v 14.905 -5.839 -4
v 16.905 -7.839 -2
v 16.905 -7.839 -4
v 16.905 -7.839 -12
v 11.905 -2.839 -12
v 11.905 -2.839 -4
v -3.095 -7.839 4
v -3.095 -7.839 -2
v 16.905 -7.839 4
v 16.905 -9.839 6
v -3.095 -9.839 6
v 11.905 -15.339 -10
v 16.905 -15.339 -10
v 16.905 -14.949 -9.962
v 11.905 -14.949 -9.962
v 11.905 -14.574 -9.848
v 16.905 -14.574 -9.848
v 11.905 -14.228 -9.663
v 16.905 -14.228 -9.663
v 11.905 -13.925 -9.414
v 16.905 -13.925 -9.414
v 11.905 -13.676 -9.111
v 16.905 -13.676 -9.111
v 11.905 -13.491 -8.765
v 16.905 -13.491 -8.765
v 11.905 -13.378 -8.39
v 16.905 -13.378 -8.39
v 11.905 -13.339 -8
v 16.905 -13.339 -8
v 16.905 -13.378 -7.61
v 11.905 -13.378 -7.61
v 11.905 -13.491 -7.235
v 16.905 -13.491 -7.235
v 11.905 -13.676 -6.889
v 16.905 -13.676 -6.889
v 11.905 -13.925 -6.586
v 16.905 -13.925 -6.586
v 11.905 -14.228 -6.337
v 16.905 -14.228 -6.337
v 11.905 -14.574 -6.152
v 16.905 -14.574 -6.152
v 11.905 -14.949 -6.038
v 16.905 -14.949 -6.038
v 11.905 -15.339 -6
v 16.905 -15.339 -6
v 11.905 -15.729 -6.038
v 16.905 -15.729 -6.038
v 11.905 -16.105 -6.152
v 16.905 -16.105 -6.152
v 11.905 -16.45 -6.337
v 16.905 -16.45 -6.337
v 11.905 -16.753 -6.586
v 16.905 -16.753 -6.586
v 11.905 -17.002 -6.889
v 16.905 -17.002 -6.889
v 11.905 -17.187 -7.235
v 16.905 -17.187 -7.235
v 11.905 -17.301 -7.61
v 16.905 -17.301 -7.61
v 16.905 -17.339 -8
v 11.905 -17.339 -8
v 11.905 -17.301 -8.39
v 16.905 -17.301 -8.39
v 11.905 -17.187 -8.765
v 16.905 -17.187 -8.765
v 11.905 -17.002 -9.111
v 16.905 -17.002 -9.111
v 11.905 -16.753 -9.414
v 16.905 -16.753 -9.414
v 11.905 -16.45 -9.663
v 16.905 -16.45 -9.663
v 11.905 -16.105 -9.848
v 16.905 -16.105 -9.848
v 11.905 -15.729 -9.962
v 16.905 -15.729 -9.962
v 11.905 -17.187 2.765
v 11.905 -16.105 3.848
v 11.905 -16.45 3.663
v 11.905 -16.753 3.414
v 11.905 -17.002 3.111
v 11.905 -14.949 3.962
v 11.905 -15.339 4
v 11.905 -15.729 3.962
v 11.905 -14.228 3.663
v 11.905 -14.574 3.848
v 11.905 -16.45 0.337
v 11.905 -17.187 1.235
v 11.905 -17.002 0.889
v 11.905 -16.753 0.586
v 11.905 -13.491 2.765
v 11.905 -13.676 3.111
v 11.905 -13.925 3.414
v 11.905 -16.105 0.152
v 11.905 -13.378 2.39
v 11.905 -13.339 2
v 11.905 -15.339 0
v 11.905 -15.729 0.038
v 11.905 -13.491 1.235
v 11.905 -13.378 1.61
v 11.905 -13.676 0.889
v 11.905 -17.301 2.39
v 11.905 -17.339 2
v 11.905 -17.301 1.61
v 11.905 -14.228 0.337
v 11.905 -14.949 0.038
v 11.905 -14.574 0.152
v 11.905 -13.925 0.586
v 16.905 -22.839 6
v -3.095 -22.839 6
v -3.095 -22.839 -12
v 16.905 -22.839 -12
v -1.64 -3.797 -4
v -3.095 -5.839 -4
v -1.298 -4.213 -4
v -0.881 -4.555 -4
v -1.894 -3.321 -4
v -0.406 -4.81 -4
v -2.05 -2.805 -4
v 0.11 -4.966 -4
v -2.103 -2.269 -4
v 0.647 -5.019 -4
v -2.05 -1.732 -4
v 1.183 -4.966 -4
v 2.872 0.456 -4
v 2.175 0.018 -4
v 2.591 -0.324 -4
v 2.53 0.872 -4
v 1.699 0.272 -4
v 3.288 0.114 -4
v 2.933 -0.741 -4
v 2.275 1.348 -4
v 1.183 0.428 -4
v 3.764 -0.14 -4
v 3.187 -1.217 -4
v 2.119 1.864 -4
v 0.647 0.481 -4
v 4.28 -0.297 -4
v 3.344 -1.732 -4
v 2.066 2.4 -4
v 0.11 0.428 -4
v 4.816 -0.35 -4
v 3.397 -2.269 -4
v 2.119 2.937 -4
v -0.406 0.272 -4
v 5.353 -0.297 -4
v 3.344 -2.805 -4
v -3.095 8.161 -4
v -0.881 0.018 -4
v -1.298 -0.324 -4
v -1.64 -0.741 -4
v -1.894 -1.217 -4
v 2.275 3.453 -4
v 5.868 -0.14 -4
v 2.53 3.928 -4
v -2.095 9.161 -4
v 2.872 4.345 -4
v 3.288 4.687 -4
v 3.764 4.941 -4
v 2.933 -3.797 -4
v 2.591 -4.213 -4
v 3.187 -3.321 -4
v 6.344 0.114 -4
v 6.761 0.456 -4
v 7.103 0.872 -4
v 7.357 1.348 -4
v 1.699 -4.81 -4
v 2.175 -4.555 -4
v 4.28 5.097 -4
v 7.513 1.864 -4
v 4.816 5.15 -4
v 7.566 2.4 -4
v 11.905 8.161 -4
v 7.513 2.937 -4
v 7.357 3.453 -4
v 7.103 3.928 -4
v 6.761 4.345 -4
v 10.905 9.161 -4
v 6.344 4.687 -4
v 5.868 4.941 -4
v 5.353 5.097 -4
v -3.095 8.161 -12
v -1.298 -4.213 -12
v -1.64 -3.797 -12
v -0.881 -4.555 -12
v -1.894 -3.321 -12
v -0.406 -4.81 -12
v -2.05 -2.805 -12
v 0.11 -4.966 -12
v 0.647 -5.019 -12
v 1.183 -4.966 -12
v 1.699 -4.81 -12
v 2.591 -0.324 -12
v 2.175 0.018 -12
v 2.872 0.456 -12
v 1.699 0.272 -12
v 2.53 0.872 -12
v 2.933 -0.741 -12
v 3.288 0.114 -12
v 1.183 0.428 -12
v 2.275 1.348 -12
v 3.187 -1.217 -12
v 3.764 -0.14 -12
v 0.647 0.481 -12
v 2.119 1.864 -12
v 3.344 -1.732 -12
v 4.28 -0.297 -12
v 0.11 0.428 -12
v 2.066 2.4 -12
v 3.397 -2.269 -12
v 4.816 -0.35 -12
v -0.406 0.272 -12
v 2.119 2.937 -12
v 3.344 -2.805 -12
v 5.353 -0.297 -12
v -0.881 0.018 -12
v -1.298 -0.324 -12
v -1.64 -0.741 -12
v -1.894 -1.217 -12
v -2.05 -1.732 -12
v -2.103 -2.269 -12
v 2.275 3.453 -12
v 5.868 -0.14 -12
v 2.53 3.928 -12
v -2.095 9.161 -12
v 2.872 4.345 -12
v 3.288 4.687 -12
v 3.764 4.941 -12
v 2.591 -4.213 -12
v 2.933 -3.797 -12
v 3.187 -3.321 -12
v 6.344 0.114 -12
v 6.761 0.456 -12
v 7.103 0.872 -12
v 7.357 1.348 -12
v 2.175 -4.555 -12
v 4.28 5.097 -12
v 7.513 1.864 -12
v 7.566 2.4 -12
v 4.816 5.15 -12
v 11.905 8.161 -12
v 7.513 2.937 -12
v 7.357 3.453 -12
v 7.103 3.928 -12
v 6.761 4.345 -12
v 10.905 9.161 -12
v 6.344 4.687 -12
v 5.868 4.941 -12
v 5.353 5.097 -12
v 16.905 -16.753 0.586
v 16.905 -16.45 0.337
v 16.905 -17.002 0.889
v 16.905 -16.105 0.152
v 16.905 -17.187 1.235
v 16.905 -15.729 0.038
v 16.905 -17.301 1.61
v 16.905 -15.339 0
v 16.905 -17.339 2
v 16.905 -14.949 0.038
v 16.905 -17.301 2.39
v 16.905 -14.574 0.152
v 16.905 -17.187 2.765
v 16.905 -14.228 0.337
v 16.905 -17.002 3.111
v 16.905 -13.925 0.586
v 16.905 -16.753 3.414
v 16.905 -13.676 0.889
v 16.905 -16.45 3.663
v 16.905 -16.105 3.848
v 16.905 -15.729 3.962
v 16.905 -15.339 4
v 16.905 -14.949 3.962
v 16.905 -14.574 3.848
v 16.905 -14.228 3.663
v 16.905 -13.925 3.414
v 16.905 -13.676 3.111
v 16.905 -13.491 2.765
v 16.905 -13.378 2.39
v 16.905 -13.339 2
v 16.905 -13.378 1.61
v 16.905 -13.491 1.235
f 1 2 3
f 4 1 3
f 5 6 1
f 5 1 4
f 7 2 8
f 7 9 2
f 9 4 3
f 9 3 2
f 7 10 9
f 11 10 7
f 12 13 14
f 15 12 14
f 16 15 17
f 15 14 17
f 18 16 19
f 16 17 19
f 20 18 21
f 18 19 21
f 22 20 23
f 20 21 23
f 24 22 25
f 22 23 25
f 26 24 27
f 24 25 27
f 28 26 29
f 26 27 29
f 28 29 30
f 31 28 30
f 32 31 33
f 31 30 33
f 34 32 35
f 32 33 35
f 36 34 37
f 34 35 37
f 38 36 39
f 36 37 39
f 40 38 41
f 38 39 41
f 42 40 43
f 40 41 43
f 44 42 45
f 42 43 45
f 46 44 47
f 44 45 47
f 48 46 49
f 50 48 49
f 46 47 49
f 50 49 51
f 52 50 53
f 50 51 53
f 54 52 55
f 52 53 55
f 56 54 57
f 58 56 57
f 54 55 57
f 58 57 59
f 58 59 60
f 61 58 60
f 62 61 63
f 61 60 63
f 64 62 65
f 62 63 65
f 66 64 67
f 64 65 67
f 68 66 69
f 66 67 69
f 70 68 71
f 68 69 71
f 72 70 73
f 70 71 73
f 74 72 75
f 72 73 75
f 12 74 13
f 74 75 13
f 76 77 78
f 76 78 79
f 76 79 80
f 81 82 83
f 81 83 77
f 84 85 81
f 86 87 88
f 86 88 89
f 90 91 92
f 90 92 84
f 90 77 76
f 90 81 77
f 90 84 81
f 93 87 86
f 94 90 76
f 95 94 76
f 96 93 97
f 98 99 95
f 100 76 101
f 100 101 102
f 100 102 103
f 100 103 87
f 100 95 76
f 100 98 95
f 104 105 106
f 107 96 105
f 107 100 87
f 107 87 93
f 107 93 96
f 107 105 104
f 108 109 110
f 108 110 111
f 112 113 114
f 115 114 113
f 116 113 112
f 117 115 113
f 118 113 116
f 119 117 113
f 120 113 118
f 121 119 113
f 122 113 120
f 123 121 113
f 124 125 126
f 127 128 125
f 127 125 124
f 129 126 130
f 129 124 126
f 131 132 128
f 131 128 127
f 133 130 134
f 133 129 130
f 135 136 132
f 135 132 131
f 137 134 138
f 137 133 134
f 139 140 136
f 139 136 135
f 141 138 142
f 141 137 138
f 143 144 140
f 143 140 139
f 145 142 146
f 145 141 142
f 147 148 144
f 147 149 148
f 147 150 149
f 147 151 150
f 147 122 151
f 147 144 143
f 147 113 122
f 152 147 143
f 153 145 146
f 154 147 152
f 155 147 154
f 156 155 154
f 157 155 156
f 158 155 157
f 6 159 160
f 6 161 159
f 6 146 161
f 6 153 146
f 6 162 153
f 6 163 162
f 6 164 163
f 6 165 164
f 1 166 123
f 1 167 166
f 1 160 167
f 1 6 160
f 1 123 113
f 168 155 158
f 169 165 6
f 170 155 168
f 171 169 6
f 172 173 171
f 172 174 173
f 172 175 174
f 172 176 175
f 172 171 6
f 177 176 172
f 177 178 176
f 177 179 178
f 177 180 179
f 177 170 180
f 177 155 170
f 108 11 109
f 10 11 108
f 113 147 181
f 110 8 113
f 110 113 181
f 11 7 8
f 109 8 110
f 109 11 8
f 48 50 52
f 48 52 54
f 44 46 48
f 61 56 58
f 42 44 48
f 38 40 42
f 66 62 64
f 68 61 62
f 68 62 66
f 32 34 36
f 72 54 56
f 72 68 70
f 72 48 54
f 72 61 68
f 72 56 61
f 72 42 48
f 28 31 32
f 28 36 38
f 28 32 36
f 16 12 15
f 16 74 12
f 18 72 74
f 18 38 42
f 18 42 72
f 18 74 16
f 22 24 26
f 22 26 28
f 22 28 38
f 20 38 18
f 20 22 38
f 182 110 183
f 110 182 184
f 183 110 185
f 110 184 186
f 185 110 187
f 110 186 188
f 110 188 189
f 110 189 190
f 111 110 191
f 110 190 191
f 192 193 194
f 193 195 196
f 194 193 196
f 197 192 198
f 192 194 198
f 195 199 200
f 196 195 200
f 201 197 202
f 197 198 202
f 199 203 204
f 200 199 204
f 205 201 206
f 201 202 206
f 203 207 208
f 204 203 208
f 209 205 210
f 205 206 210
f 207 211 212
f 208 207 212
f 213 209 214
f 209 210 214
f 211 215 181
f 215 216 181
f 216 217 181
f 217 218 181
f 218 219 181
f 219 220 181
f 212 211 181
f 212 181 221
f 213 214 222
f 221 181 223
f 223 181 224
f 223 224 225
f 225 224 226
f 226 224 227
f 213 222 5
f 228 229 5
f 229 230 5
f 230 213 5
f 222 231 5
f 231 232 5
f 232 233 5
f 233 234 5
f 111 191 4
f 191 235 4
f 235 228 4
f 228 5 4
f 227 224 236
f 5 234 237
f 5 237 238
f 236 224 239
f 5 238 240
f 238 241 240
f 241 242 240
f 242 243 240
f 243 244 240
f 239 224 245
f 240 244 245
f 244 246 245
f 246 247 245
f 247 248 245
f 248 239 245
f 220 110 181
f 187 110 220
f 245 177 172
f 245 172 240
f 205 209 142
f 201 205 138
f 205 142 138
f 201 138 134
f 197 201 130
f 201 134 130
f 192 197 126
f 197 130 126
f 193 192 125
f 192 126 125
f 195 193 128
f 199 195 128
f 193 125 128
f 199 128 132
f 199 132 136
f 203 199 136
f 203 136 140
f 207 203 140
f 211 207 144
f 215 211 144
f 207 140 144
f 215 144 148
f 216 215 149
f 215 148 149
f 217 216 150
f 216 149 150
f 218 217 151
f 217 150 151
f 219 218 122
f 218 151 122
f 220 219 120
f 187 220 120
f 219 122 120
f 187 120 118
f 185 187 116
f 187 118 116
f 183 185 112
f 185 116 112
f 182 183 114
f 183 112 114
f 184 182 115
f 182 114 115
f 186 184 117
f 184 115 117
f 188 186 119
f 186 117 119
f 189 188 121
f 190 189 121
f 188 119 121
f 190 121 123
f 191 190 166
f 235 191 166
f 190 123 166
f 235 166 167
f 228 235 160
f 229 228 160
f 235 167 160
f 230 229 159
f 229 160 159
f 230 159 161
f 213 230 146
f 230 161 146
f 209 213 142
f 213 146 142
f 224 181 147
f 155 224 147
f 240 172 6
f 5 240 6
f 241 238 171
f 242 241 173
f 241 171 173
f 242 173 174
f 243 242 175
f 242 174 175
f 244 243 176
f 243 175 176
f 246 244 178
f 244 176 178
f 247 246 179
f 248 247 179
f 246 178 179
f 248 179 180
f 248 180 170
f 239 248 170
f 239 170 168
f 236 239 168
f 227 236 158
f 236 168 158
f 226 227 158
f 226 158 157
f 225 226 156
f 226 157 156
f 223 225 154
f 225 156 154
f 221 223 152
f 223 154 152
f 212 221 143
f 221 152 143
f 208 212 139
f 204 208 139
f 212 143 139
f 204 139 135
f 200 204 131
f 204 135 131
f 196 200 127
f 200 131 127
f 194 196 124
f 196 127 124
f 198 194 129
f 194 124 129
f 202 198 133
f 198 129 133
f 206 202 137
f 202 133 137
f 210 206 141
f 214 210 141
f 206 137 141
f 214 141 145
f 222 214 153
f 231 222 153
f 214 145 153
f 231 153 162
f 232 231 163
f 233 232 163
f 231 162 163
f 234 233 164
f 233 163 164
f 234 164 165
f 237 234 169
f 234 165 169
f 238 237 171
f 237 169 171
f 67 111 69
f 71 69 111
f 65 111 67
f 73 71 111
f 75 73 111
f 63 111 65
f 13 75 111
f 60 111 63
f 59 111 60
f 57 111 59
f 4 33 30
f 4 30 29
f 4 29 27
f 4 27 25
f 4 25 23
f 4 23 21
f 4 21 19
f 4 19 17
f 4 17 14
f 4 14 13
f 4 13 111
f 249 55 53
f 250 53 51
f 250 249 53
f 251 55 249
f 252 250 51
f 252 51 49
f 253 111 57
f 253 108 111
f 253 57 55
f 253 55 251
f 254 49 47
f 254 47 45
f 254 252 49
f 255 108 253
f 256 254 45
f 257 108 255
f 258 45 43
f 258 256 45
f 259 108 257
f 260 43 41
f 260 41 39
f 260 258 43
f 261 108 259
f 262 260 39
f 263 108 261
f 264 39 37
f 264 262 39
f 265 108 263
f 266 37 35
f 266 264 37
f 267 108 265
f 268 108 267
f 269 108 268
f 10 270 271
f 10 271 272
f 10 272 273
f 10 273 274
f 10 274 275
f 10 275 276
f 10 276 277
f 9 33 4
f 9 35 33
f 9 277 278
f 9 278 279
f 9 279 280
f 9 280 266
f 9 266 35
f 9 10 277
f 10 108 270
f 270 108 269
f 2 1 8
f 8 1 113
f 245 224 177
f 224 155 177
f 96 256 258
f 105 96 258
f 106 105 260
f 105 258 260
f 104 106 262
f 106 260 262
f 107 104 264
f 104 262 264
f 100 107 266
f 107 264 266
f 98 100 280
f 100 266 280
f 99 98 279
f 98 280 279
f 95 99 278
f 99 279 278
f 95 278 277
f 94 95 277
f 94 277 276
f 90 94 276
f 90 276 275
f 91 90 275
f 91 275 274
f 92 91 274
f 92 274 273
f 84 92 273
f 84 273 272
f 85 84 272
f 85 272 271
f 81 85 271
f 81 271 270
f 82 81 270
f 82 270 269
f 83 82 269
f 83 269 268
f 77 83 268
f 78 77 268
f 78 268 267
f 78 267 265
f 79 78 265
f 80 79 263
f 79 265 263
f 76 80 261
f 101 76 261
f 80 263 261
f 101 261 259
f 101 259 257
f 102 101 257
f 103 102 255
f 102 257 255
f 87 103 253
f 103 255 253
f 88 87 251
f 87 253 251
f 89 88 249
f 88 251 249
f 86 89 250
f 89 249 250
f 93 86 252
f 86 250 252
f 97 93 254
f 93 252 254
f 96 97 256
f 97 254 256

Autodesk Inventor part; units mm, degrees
ref_plane "YZ Plane" through (0, 0, 0) normal (1, 0, 0) x (0, 1, 0)
ref_plane "XZ Plane" through (0, 0, 0) normal (0, 1, 0) x (-1, 0, 0)
ref_plane "XY Plane" through (0, 0, 0) normal (0, 0, 1) x (1, 0, 0)
sketch "草图1" plane through (0, 0, 0) normal (0, 0, 1) x (1, 0, 0)
  circle A0 centre (0.6467, -2.2689) radius 2.75
  circle A1 centre (4.8161, 2.4002) radius 2.5 construction
  circle A2 centre (4.8161, 2.4002) radius 2.5 construction
  circle A3 centre (4.8161, 2.4002) radius 2.5 construction
  line L0 (16.9048, -7.8392) -> (-3.0952, -7.8392)
  line L1 (-3.0952, -7.8392) -> (-3.0952, -22.8392)
  line L2 (-3.0952, -22.8392) -> (16.9048, -22.8392)
  line L3 (16.9048, -22.8392) -> (16.9048, -7.8392)
  line L4 (16.9048, -6.8375) -> (16.9048, -82.9867) projected
  line L5 (-1.0952, -7.8392) -> (16.9048, -7.8392) projected
  line L6 (-3.0952, 9.1608) -> (11.9048, 9.1608)
  line L7 (11.9048, 9.1608) -> (11.9048, -22.8392)
  line L8 (11.9048, -22.8392) -> (-3.0952, -22.8392)
  line L9 (-3.0952, -22.8392) -> (-3.0952, 9.1608)
  circle A4 centre (4.8161, 2.4002) radius 2.75
  point P0 (-3.0952, -7.8392)
  point P1 (11.9048, -7.8392)
  dimension "d2" = 15
  dimension "d3" = 20
  dimension "d4" = 15
  dimension "d5" = 17
  dimension "d26" = 5.5
  dimension "d28" = 5.5
extrude "拉伸1" add sketch "草图1" against normal blind 12
move faces "移动1" translate (0, 0, -4) faces at (8.5714, -17.8392, 0)
sketch "草图3" plane through (-3.0952, -22.8392, -4) normal (0, 0, 1) x (1, 0, 0)
  line L0 (20, 15) -> (20, 0) projected
  line L1 (0, 0) -> (0, 32) projected
  line L2 (20, 0) -> (0, 0)
  line L3 (0, 0) -> (0, 15)
  line L4 (0, 15) -> (20, 15)
  line L5 (20, 15) -> (20, 0)
  line L6 (20, 15) -> (15, 15) projected
  point P0 (3.0952, 22.8392)
extrude "拉伸2" add sketch "草图3" along normal blind 10
chamfer "倒角1" distance 5 angle 45 1 edges at (11.9048, -7.8392, -8)
chamfer "倒角2" distance 1 angle 45 2 edges at (-3.0952, 9.1608, -8) (11.9048, 9.1608, -8)
sketch "草图4" plane through (16.9048, -22.8392, 6) normal (1, 0, 0) x (0, 0, -1)
  circle A0 centre (4, 7.5) radius 2
  line L0 (0, 15) -> (0, 0) projected
  line L1 (0, 7.5) -> (18, 7.5)
  line L2 (18, 0) -> (18, 31) projected
  circle A1 centre (14, 7.5) radius 2
  line L3 (0, 0) -> (0, 15) projected
  point P0 (6, 22.8392)
  point P1 (0, 7.5)
  dimension "d17" = 4
  dimension "d18" = 4
  dimension "d19" = 10
  dimension "d20" = 4
extrude "拉伸3" cut sketch "草图4" against normal blind 5
chamfer "倒角3" distance 2 angle 45 2 edges at (6.9048, -7.8392, 6) (6.9047, -7.8392, -4)
properties part number "滚纸"
